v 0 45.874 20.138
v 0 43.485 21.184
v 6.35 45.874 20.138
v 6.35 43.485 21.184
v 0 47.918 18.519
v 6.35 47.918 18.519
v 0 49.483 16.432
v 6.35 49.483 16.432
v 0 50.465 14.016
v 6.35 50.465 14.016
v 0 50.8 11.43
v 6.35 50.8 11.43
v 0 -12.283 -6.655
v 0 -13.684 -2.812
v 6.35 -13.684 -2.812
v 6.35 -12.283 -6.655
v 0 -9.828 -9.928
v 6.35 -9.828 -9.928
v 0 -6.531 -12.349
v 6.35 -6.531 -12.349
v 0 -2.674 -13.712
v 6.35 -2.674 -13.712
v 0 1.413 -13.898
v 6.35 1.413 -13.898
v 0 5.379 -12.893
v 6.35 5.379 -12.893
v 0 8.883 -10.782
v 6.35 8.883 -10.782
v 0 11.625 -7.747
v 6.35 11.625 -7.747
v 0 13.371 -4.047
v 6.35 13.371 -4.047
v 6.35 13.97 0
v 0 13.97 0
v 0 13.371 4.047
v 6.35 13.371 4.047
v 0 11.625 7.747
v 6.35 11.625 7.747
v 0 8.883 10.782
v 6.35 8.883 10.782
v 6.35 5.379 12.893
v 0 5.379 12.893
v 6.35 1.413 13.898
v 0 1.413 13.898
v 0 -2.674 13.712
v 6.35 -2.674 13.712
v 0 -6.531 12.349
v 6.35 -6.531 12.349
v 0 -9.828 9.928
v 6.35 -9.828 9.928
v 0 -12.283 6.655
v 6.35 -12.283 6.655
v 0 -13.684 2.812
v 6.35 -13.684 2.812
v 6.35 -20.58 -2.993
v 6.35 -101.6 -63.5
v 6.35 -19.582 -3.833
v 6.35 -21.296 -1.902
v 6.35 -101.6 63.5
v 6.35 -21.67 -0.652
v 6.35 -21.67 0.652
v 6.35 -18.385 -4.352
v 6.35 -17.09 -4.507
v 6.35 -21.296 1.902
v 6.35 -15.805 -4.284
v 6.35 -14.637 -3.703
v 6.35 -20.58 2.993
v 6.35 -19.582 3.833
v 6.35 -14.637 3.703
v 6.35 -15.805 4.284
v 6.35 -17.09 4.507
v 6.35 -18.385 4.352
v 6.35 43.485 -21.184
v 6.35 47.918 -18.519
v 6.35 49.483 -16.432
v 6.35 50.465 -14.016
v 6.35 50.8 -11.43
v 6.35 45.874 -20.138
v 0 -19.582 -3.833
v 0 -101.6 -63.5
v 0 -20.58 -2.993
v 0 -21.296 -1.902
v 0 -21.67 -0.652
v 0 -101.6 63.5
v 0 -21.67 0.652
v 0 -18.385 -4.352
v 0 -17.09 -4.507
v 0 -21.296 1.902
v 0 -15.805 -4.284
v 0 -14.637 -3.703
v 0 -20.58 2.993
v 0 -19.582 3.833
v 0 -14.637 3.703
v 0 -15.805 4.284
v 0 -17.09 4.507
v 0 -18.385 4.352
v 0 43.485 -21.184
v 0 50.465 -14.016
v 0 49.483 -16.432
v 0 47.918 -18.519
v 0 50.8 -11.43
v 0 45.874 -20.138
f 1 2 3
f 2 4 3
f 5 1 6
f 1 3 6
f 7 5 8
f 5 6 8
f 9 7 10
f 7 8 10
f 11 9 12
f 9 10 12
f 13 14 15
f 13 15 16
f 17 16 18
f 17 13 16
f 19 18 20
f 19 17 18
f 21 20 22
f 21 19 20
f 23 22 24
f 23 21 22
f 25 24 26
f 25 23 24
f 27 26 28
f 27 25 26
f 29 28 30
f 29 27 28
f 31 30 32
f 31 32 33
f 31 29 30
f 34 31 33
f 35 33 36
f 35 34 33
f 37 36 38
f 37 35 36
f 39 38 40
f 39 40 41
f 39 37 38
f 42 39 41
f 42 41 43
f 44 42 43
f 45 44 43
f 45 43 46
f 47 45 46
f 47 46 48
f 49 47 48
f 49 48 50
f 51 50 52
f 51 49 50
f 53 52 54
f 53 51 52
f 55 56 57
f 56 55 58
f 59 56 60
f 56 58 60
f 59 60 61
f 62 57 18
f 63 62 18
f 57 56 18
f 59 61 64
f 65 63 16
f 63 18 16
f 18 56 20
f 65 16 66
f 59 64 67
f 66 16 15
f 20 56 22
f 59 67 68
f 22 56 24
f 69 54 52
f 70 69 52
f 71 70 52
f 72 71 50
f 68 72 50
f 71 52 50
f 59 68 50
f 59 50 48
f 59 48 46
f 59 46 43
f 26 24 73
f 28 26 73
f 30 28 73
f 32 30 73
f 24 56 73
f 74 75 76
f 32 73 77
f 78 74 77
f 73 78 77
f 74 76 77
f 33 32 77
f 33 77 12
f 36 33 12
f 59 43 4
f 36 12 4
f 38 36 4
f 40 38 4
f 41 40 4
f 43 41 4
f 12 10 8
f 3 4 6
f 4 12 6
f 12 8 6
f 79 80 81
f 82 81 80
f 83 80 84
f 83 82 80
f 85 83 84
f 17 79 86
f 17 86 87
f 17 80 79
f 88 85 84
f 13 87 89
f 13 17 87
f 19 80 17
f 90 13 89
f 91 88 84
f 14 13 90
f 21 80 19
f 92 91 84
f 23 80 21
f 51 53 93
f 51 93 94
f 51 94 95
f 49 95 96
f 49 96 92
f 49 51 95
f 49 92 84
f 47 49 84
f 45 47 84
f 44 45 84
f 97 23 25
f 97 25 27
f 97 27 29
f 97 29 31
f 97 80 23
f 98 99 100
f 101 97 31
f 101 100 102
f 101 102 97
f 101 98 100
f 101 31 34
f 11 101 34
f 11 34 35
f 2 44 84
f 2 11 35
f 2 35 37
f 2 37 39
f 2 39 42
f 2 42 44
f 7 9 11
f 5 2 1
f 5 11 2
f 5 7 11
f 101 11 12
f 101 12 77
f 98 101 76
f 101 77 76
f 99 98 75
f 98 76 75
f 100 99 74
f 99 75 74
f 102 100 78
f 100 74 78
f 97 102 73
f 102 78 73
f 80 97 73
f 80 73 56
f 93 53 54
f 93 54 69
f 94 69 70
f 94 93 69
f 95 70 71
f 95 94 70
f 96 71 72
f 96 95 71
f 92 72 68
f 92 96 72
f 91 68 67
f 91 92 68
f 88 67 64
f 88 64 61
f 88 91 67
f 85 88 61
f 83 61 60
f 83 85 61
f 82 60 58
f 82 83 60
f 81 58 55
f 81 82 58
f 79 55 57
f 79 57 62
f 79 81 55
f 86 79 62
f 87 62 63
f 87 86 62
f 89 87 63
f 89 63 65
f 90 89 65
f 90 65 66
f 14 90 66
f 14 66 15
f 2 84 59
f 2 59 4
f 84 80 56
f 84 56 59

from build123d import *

# Parameters (mm, degrees)
BOSS_EXTRUDE1_DEPTH = 6.35
FILLET2_R           = 10.16


with BuildPart() as part:
    # Sketch1 → Boss-Extrude1 (new body)
    with BuildSketch(Plane(origin=(0, 0, 0), x_dir=(0, 0, -1), z_dir=(1, 0, 0))):
        Polygon((-63.5, -101.6), (-19.05, 50.8), (19.05, 50.8), (63.5, -101.6), align=None)
        with BuildLine():
            ThreePointArc((2.811655808, -13.684132841), (0, 13.97), (-2.811655808, -13.684132841))
            ThreePointArc((-2.811655808, -13.684132841), (0, -21.717), (2.811655808, -13.684132841))
        make_face(mode=Mode.SUBTRACT)
    extrude(amount=BOSS_EXTRUDE1_DEPTH)

    # Fillet2
    fillet2_edges = [part.edges().sort_by_distance(p)[0] for p in [
        (3.175, 50.8, 19.05),
        (3.175, 50.8, -19.05),
    ]]
    fillet(fillet2_edges, radius=FILLET2_R)


solid = part.part
